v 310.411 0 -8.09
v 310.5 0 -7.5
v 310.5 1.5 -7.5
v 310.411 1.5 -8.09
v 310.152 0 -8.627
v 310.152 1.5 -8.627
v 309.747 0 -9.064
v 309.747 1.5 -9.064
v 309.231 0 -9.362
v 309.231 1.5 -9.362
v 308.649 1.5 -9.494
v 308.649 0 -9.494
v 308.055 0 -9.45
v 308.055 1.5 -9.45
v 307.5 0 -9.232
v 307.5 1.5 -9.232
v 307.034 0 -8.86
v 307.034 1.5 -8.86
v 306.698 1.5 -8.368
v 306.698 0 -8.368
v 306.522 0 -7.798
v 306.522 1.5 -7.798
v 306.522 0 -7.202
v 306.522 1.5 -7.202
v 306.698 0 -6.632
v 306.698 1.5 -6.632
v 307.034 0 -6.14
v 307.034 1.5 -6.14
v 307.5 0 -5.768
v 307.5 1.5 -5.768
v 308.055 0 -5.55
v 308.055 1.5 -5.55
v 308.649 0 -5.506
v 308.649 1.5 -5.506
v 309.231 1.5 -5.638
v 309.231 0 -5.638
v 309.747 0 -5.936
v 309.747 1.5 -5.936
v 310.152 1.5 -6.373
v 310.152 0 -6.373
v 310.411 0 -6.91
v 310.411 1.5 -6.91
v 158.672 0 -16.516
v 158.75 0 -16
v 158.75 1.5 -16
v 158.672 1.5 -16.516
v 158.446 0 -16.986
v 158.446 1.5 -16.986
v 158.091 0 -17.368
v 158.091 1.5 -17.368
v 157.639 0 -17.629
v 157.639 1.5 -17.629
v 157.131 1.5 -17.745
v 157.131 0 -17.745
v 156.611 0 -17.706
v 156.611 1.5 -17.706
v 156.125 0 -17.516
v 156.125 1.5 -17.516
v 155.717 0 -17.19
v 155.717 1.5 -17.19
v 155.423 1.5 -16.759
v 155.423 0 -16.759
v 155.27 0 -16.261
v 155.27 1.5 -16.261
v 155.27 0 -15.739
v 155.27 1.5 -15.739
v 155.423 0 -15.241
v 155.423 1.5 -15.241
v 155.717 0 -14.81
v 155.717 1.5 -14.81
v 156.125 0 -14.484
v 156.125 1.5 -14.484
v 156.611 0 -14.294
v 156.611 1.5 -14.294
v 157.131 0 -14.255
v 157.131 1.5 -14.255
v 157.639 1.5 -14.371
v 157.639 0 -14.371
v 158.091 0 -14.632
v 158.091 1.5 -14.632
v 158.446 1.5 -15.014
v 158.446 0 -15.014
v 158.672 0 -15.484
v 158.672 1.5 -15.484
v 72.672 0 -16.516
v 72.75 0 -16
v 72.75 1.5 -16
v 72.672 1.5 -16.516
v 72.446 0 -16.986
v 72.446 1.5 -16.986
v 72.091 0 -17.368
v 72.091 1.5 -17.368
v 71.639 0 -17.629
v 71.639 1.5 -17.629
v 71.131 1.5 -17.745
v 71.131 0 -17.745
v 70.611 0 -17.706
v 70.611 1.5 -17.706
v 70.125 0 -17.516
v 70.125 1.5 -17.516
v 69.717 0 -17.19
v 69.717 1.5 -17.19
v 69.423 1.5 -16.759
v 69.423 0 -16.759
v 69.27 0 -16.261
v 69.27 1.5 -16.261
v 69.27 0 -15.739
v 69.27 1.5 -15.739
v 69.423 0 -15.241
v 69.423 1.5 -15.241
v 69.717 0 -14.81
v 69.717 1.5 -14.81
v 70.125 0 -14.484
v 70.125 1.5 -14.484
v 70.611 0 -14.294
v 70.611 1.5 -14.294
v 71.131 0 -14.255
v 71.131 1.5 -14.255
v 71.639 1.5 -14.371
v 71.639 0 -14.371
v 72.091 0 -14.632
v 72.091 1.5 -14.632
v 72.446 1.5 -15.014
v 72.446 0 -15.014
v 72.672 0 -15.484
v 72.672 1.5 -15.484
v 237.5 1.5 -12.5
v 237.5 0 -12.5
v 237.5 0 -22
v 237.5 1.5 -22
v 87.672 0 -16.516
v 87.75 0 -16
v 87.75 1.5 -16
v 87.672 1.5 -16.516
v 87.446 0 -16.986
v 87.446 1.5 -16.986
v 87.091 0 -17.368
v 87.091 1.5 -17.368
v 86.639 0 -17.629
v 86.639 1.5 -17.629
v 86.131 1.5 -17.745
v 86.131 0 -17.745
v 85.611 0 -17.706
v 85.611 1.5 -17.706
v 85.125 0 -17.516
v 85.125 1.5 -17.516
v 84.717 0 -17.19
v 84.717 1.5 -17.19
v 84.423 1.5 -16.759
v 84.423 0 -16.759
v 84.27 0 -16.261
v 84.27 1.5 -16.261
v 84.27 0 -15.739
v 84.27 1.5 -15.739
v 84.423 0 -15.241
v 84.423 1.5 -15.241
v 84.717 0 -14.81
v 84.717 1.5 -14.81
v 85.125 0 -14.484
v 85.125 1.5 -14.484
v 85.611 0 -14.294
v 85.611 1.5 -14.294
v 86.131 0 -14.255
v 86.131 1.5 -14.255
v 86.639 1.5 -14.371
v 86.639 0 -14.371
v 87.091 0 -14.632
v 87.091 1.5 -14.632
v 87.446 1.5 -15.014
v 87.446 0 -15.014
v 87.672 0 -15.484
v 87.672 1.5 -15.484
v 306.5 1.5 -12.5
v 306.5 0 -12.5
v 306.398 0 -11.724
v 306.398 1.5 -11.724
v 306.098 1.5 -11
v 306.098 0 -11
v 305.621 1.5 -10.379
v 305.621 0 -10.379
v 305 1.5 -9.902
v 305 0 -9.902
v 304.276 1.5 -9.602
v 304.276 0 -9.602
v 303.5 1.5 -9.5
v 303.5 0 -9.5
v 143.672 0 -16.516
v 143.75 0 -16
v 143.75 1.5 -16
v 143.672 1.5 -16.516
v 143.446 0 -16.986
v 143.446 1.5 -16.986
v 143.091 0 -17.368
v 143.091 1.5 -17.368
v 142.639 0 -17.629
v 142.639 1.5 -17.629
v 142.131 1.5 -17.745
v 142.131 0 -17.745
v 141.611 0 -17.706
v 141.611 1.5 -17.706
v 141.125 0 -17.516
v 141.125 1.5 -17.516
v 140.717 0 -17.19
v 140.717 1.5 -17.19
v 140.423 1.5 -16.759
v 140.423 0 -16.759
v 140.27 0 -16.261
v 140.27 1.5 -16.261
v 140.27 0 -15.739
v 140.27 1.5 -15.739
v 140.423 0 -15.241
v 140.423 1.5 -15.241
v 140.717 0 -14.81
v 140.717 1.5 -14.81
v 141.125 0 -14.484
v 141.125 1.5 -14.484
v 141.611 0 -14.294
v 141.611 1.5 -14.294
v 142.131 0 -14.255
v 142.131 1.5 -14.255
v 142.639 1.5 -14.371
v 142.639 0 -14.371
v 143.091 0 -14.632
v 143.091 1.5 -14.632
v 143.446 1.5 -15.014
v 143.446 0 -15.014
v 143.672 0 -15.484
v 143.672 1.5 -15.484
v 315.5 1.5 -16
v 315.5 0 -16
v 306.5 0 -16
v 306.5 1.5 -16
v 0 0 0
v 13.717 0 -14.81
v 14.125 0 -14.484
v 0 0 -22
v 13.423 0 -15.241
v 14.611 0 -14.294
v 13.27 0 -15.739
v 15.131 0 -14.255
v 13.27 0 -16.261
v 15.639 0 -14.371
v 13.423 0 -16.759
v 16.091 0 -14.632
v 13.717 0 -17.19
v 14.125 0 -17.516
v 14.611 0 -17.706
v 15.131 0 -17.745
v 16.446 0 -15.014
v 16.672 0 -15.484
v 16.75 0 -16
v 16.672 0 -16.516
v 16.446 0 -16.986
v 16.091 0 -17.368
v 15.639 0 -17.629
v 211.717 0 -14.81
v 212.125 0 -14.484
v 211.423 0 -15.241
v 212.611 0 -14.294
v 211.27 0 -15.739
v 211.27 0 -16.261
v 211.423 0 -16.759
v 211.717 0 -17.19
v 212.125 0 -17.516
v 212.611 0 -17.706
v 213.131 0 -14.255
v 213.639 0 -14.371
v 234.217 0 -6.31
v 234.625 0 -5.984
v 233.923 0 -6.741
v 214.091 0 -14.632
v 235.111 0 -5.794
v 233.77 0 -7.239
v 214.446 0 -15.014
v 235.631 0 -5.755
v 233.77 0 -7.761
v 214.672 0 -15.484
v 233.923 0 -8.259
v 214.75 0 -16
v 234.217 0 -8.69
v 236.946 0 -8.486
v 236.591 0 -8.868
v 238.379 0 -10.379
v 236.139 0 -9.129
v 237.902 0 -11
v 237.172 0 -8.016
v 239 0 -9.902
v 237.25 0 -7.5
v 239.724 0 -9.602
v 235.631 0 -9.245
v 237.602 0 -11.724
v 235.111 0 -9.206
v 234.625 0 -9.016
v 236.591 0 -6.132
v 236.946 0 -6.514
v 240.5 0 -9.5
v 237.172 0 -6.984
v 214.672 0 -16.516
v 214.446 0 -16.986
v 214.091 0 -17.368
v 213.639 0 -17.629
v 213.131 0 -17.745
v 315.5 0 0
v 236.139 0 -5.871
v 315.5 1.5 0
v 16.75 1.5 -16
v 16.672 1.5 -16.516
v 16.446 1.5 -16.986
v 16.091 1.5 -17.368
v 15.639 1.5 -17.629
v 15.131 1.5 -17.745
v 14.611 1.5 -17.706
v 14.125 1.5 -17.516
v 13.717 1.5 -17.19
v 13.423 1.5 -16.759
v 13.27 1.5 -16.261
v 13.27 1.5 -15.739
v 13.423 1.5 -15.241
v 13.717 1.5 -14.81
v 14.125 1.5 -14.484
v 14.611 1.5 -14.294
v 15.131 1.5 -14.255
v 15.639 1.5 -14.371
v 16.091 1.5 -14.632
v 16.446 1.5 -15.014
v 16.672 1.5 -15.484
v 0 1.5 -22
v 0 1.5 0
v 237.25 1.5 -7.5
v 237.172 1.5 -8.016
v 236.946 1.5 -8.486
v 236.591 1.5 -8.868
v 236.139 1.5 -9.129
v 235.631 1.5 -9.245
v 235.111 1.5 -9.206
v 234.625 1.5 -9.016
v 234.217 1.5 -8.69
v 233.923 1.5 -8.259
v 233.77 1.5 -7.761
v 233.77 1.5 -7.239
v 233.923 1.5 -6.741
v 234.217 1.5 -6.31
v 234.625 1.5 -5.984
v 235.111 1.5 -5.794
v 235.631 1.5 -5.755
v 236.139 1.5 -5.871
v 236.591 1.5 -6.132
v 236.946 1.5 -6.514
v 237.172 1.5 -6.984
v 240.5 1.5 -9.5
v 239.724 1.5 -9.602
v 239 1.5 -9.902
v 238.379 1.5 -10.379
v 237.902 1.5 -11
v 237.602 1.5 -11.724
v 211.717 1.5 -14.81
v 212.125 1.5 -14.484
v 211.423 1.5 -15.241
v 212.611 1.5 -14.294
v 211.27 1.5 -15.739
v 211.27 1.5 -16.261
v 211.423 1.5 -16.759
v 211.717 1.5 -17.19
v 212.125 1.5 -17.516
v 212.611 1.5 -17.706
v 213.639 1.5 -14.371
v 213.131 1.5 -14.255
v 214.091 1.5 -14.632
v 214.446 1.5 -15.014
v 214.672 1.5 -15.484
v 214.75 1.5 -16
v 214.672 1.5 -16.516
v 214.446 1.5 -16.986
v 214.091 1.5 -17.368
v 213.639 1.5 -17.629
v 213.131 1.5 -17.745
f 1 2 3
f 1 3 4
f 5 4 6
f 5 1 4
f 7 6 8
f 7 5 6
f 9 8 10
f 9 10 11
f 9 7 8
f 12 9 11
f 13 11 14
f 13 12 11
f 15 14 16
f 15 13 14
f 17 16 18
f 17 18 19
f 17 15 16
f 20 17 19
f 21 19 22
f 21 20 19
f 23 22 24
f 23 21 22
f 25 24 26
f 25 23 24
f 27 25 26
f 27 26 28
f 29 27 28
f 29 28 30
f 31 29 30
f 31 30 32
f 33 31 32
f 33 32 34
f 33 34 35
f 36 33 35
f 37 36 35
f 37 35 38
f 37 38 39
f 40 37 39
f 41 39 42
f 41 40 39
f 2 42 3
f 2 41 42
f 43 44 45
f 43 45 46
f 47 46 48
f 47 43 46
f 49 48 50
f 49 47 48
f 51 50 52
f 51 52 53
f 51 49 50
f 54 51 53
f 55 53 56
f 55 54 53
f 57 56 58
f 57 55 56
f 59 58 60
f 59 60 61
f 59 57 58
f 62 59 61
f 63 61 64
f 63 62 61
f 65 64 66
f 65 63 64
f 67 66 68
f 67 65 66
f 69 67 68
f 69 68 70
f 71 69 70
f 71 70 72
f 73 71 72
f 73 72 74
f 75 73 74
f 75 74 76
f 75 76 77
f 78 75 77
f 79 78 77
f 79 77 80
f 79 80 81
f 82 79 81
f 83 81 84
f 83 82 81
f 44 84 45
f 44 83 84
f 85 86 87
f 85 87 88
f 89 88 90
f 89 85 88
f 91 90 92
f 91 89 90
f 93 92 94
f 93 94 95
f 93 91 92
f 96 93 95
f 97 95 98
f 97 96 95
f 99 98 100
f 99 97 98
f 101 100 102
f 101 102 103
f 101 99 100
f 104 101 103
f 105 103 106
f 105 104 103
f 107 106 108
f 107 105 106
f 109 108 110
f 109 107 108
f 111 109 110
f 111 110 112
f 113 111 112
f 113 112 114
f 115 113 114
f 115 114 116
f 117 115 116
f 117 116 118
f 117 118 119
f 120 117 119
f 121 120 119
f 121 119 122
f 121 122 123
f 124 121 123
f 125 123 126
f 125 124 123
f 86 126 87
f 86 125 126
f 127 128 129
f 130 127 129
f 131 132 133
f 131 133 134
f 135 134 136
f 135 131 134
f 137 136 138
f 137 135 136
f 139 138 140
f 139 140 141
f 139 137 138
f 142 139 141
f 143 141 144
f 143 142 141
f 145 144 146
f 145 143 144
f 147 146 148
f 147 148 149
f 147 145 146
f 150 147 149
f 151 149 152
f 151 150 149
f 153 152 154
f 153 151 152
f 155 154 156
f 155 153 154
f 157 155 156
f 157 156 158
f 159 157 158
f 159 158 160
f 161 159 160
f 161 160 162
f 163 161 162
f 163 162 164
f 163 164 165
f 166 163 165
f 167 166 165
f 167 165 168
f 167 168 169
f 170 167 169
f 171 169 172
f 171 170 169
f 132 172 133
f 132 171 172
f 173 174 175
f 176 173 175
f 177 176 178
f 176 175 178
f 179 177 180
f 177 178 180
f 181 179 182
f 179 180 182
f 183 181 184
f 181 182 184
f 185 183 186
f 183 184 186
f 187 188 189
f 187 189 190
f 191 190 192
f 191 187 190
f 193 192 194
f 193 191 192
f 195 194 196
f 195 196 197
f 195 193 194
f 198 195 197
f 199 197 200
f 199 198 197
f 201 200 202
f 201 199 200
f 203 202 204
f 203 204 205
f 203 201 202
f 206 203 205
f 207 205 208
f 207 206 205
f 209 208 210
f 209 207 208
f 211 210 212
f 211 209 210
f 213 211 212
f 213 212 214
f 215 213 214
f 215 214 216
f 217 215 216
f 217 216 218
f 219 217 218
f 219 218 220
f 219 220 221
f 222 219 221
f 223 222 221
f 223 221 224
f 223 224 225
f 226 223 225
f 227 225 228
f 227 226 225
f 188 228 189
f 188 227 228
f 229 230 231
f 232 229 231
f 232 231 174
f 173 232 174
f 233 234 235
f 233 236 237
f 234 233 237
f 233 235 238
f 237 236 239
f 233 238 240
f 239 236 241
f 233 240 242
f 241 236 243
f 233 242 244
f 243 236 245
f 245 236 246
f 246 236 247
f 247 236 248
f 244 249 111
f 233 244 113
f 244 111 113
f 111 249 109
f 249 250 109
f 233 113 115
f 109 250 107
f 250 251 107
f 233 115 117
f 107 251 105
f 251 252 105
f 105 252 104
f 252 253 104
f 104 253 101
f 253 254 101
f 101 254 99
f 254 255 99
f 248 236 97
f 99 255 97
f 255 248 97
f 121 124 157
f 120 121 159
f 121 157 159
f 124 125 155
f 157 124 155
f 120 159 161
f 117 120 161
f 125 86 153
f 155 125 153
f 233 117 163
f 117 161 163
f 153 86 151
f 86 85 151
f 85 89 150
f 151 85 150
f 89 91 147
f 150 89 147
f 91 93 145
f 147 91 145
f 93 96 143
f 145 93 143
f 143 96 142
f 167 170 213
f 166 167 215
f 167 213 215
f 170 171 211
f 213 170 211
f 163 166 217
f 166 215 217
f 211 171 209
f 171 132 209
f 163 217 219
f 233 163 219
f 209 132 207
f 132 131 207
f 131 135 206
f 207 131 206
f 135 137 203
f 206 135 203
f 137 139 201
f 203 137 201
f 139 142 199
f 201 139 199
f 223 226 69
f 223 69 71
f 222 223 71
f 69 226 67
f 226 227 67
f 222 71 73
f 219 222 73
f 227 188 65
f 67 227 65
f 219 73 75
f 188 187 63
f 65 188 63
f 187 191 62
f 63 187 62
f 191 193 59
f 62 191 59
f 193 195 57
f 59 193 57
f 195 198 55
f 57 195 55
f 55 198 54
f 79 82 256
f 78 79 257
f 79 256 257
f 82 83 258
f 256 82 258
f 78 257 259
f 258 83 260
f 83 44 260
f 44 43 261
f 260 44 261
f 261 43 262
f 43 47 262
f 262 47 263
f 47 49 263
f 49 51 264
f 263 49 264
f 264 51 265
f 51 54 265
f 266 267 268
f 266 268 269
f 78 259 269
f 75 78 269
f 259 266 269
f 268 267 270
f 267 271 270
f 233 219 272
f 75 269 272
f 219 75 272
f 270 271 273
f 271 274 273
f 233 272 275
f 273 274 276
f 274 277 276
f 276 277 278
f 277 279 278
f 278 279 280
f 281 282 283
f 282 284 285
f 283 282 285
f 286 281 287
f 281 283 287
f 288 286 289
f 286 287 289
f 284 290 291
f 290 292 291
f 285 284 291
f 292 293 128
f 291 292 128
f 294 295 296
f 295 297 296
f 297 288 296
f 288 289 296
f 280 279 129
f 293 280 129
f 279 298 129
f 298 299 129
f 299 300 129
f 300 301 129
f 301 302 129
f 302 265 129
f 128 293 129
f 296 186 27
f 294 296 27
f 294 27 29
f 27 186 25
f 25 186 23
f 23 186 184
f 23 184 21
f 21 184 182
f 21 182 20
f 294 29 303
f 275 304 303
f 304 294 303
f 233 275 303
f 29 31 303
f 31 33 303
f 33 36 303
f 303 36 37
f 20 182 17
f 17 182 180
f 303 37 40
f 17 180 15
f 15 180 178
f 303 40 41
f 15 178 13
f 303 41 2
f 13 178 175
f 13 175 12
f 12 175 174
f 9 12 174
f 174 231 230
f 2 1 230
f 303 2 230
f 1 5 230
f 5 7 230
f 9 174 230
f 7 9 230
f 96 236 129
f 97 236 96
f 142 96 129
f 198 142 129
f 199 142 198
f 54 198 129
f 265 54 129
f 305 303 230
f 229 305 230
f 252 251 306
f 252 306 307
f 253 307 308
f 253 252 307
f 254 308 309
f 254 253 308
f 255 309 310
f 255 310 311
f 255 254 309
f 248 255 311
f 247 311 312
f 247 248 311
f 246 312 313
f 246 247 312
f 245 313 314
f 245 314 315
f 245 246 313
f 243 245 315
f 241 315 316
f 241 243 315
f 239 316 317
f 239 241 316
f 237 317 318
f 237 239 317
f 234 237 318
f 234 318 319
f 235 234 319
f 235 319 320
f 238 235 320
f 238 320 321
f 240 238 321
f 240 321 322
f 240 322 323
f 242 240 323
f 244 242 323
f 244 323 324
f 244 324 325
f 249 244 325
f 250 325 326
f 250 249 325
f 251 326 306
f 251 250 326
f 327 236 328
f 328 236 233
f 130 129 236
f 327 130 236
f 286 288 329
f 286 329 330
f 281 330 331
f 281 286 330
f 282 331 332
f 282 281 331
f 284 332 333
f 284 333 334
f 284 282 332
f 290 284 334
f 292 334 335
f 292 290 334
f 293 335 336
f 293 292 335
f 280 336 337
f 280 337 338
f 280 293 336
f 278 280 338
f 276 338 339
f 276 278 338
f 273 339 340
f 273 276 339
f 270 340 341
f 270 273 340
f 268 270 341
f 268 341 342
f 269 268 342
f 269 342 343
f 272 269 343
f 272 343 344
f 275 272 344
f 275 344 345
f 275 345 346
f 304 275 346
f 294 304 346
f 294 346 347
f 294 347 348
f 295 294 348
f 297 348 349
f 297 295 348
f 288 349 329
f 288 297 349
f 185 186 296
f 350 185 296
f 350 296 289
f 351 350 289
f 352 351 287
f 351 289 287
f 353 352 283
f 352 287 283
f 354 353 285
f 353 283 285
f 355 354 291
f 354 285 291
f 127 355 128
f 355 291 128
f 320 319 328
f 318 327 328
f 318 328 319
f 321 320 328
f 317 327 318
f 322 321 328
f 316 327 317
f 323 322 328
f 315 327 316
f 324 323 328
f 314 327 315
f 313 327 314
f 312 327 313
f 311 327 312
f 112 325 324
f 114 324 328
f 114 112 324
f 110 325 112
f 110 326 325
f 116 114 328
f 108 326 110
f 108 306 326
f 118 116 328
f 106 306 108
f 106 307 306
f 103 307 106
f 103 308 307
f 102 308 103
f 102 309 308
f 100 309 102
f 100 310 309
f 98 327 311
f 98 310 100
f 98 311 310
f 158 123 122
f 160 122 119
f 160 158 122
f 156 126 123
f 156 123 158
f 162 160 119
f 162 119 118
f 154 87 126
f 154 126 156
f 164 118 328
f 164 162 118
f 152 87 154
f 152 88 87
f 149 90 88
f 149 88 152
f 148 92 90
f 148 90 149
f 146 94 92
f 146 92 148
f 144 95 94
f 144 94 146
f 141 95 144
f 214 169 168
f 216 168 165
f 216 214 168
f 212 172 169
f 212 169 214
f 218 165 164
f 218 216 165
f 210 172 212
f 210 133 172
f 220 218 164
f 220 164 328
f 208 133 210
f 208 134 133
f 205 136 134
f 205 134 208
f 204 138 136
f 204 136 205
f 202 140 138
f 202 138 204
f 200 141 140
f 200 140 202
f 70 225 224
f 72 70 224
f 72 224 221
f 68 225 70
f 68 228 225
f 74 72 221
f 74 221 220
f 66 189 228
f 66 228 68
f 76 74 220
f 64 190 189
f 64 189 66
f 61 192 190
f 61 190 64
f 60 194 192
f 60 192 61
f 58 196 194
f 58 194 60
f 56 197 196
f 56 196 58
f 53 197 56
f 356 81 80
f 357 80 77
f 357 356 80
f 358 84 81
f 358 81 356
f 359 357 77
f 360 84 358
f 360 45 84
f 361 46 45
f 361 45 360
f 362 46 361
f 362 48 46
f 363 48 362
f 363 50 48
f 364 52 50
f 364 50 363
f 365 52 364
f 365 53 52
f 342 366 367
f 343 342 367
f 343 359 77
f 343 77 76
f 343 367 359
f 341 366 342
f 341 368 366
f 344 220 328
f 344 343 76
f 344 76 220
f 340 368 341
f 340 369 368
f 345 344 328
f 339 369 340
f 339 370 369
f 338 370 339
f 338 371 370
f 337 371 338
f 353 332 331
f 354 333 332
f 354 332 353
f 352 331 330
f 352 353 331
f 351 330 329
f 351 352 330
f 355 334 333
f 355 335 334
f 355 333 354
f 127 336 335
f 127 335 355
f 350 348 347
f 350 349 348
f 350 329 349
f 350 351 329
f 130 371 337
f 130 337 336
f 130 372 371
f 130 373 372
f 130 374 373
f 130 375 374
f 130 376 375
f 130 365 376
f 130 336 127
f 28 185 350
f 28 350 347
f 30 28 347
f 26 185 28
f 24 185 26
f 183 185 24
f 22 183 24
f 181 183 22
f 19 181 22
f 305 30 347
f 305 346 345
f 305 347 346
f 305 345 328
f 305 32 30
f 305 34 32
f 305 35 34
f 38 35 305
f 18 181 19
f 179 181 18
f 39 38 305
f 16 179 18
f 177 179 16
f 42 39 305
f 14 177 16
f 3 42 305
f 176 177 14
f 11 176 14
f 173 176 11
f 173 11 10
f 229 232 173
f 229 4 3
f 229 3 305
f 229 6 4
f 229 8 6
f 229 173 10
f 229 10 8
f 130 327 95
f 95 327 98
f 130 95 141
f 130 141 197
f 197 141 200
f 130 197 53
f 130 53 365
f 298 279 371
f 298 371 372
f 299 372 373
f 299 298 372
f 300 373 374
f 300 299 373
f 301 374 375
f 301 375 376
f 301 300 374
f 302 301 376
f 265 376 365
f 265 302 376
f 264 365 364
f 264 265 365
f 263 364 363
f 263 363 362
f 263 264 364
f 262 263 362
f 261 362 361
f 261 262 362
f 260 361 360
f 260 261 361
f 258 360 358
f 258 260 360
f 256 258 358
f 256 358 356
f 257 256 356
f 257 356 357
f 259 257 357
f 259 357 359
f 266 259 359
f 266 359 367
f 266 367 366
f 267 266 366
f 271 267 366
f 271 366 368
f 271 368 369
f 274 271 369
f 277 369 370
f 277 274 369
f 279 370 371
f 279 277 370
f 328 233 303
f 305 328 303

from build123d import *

# Parameters (mm, degrees)
SKETCH_1_R      = 1.75
SKETCH_1_R_2    = 2
EXTRUDE_1_DEPTH = 1.5


with BuildPart() as part:
    # Эскиз1 → Бобышка-Вытянуть1 (new body)
    with BuildSketch(Plane(origin=(0, 0, 0), x_dir=(1, 0, 0), z_dir=(0, 1, 0))):
        with BuildLine():
            Line((237.5, 12.5), (237.5, 22))
            Line((237.5, 22), (0, 22))
            Line((0, 22), (0, 0))
            Line((0, 0), (315.5, 0))
            Line((315.5, 0), (315.5, 16))
            Line((315.5, 16), (306.5, 16))
            Line((306.5, 16), (306.5, 12.5))
            ThreePointArc((306.5, 12.5), (305.621320344, 10.378679656), (303.5, 9.5))
            Line((303.5, 9.5), (240.5, 9.5))
            ThreePointArc((240.5, 9.5), (238.378679656, 10.378679656), (237.5, 12.5))
        make_face()
        with Locations((235.5, 7.5)):
            Circle(SKETCH_1_R, mode=Mode.SUBTRACT)
        with Locations((308.5, 7.5)):
            Circle(SKETCH_1_R_2, mode=Mode.SUBTRACT)
        with Locations((15, 16)):
            Circle(SKETCH_1_R, mode=Mode.SUBTRACT)
        with Locations((71, 16)):
            Circle(SKETCH_1_R, mode=Mode.SUBTRACT)
        with Locations((86, 16)):
            Circle(SKETCH_1_R, mode=Mode.SUBTRACT)
        with Locations((142, 16)):
            Circle(SKETCH_1_R, mode=Mode.SUBTRACT)
        with Locations((157, 16)):
            Circle(SKETCH_1_R, mode=Mode.SUBTRACT)
        with Locations((213, 16)):
            Circle(SKETCH_1_R, mode=Mode.SUBTRACT)
    extrude(amount=EXTRUDE_1_DEPTH)


solid = part.part
